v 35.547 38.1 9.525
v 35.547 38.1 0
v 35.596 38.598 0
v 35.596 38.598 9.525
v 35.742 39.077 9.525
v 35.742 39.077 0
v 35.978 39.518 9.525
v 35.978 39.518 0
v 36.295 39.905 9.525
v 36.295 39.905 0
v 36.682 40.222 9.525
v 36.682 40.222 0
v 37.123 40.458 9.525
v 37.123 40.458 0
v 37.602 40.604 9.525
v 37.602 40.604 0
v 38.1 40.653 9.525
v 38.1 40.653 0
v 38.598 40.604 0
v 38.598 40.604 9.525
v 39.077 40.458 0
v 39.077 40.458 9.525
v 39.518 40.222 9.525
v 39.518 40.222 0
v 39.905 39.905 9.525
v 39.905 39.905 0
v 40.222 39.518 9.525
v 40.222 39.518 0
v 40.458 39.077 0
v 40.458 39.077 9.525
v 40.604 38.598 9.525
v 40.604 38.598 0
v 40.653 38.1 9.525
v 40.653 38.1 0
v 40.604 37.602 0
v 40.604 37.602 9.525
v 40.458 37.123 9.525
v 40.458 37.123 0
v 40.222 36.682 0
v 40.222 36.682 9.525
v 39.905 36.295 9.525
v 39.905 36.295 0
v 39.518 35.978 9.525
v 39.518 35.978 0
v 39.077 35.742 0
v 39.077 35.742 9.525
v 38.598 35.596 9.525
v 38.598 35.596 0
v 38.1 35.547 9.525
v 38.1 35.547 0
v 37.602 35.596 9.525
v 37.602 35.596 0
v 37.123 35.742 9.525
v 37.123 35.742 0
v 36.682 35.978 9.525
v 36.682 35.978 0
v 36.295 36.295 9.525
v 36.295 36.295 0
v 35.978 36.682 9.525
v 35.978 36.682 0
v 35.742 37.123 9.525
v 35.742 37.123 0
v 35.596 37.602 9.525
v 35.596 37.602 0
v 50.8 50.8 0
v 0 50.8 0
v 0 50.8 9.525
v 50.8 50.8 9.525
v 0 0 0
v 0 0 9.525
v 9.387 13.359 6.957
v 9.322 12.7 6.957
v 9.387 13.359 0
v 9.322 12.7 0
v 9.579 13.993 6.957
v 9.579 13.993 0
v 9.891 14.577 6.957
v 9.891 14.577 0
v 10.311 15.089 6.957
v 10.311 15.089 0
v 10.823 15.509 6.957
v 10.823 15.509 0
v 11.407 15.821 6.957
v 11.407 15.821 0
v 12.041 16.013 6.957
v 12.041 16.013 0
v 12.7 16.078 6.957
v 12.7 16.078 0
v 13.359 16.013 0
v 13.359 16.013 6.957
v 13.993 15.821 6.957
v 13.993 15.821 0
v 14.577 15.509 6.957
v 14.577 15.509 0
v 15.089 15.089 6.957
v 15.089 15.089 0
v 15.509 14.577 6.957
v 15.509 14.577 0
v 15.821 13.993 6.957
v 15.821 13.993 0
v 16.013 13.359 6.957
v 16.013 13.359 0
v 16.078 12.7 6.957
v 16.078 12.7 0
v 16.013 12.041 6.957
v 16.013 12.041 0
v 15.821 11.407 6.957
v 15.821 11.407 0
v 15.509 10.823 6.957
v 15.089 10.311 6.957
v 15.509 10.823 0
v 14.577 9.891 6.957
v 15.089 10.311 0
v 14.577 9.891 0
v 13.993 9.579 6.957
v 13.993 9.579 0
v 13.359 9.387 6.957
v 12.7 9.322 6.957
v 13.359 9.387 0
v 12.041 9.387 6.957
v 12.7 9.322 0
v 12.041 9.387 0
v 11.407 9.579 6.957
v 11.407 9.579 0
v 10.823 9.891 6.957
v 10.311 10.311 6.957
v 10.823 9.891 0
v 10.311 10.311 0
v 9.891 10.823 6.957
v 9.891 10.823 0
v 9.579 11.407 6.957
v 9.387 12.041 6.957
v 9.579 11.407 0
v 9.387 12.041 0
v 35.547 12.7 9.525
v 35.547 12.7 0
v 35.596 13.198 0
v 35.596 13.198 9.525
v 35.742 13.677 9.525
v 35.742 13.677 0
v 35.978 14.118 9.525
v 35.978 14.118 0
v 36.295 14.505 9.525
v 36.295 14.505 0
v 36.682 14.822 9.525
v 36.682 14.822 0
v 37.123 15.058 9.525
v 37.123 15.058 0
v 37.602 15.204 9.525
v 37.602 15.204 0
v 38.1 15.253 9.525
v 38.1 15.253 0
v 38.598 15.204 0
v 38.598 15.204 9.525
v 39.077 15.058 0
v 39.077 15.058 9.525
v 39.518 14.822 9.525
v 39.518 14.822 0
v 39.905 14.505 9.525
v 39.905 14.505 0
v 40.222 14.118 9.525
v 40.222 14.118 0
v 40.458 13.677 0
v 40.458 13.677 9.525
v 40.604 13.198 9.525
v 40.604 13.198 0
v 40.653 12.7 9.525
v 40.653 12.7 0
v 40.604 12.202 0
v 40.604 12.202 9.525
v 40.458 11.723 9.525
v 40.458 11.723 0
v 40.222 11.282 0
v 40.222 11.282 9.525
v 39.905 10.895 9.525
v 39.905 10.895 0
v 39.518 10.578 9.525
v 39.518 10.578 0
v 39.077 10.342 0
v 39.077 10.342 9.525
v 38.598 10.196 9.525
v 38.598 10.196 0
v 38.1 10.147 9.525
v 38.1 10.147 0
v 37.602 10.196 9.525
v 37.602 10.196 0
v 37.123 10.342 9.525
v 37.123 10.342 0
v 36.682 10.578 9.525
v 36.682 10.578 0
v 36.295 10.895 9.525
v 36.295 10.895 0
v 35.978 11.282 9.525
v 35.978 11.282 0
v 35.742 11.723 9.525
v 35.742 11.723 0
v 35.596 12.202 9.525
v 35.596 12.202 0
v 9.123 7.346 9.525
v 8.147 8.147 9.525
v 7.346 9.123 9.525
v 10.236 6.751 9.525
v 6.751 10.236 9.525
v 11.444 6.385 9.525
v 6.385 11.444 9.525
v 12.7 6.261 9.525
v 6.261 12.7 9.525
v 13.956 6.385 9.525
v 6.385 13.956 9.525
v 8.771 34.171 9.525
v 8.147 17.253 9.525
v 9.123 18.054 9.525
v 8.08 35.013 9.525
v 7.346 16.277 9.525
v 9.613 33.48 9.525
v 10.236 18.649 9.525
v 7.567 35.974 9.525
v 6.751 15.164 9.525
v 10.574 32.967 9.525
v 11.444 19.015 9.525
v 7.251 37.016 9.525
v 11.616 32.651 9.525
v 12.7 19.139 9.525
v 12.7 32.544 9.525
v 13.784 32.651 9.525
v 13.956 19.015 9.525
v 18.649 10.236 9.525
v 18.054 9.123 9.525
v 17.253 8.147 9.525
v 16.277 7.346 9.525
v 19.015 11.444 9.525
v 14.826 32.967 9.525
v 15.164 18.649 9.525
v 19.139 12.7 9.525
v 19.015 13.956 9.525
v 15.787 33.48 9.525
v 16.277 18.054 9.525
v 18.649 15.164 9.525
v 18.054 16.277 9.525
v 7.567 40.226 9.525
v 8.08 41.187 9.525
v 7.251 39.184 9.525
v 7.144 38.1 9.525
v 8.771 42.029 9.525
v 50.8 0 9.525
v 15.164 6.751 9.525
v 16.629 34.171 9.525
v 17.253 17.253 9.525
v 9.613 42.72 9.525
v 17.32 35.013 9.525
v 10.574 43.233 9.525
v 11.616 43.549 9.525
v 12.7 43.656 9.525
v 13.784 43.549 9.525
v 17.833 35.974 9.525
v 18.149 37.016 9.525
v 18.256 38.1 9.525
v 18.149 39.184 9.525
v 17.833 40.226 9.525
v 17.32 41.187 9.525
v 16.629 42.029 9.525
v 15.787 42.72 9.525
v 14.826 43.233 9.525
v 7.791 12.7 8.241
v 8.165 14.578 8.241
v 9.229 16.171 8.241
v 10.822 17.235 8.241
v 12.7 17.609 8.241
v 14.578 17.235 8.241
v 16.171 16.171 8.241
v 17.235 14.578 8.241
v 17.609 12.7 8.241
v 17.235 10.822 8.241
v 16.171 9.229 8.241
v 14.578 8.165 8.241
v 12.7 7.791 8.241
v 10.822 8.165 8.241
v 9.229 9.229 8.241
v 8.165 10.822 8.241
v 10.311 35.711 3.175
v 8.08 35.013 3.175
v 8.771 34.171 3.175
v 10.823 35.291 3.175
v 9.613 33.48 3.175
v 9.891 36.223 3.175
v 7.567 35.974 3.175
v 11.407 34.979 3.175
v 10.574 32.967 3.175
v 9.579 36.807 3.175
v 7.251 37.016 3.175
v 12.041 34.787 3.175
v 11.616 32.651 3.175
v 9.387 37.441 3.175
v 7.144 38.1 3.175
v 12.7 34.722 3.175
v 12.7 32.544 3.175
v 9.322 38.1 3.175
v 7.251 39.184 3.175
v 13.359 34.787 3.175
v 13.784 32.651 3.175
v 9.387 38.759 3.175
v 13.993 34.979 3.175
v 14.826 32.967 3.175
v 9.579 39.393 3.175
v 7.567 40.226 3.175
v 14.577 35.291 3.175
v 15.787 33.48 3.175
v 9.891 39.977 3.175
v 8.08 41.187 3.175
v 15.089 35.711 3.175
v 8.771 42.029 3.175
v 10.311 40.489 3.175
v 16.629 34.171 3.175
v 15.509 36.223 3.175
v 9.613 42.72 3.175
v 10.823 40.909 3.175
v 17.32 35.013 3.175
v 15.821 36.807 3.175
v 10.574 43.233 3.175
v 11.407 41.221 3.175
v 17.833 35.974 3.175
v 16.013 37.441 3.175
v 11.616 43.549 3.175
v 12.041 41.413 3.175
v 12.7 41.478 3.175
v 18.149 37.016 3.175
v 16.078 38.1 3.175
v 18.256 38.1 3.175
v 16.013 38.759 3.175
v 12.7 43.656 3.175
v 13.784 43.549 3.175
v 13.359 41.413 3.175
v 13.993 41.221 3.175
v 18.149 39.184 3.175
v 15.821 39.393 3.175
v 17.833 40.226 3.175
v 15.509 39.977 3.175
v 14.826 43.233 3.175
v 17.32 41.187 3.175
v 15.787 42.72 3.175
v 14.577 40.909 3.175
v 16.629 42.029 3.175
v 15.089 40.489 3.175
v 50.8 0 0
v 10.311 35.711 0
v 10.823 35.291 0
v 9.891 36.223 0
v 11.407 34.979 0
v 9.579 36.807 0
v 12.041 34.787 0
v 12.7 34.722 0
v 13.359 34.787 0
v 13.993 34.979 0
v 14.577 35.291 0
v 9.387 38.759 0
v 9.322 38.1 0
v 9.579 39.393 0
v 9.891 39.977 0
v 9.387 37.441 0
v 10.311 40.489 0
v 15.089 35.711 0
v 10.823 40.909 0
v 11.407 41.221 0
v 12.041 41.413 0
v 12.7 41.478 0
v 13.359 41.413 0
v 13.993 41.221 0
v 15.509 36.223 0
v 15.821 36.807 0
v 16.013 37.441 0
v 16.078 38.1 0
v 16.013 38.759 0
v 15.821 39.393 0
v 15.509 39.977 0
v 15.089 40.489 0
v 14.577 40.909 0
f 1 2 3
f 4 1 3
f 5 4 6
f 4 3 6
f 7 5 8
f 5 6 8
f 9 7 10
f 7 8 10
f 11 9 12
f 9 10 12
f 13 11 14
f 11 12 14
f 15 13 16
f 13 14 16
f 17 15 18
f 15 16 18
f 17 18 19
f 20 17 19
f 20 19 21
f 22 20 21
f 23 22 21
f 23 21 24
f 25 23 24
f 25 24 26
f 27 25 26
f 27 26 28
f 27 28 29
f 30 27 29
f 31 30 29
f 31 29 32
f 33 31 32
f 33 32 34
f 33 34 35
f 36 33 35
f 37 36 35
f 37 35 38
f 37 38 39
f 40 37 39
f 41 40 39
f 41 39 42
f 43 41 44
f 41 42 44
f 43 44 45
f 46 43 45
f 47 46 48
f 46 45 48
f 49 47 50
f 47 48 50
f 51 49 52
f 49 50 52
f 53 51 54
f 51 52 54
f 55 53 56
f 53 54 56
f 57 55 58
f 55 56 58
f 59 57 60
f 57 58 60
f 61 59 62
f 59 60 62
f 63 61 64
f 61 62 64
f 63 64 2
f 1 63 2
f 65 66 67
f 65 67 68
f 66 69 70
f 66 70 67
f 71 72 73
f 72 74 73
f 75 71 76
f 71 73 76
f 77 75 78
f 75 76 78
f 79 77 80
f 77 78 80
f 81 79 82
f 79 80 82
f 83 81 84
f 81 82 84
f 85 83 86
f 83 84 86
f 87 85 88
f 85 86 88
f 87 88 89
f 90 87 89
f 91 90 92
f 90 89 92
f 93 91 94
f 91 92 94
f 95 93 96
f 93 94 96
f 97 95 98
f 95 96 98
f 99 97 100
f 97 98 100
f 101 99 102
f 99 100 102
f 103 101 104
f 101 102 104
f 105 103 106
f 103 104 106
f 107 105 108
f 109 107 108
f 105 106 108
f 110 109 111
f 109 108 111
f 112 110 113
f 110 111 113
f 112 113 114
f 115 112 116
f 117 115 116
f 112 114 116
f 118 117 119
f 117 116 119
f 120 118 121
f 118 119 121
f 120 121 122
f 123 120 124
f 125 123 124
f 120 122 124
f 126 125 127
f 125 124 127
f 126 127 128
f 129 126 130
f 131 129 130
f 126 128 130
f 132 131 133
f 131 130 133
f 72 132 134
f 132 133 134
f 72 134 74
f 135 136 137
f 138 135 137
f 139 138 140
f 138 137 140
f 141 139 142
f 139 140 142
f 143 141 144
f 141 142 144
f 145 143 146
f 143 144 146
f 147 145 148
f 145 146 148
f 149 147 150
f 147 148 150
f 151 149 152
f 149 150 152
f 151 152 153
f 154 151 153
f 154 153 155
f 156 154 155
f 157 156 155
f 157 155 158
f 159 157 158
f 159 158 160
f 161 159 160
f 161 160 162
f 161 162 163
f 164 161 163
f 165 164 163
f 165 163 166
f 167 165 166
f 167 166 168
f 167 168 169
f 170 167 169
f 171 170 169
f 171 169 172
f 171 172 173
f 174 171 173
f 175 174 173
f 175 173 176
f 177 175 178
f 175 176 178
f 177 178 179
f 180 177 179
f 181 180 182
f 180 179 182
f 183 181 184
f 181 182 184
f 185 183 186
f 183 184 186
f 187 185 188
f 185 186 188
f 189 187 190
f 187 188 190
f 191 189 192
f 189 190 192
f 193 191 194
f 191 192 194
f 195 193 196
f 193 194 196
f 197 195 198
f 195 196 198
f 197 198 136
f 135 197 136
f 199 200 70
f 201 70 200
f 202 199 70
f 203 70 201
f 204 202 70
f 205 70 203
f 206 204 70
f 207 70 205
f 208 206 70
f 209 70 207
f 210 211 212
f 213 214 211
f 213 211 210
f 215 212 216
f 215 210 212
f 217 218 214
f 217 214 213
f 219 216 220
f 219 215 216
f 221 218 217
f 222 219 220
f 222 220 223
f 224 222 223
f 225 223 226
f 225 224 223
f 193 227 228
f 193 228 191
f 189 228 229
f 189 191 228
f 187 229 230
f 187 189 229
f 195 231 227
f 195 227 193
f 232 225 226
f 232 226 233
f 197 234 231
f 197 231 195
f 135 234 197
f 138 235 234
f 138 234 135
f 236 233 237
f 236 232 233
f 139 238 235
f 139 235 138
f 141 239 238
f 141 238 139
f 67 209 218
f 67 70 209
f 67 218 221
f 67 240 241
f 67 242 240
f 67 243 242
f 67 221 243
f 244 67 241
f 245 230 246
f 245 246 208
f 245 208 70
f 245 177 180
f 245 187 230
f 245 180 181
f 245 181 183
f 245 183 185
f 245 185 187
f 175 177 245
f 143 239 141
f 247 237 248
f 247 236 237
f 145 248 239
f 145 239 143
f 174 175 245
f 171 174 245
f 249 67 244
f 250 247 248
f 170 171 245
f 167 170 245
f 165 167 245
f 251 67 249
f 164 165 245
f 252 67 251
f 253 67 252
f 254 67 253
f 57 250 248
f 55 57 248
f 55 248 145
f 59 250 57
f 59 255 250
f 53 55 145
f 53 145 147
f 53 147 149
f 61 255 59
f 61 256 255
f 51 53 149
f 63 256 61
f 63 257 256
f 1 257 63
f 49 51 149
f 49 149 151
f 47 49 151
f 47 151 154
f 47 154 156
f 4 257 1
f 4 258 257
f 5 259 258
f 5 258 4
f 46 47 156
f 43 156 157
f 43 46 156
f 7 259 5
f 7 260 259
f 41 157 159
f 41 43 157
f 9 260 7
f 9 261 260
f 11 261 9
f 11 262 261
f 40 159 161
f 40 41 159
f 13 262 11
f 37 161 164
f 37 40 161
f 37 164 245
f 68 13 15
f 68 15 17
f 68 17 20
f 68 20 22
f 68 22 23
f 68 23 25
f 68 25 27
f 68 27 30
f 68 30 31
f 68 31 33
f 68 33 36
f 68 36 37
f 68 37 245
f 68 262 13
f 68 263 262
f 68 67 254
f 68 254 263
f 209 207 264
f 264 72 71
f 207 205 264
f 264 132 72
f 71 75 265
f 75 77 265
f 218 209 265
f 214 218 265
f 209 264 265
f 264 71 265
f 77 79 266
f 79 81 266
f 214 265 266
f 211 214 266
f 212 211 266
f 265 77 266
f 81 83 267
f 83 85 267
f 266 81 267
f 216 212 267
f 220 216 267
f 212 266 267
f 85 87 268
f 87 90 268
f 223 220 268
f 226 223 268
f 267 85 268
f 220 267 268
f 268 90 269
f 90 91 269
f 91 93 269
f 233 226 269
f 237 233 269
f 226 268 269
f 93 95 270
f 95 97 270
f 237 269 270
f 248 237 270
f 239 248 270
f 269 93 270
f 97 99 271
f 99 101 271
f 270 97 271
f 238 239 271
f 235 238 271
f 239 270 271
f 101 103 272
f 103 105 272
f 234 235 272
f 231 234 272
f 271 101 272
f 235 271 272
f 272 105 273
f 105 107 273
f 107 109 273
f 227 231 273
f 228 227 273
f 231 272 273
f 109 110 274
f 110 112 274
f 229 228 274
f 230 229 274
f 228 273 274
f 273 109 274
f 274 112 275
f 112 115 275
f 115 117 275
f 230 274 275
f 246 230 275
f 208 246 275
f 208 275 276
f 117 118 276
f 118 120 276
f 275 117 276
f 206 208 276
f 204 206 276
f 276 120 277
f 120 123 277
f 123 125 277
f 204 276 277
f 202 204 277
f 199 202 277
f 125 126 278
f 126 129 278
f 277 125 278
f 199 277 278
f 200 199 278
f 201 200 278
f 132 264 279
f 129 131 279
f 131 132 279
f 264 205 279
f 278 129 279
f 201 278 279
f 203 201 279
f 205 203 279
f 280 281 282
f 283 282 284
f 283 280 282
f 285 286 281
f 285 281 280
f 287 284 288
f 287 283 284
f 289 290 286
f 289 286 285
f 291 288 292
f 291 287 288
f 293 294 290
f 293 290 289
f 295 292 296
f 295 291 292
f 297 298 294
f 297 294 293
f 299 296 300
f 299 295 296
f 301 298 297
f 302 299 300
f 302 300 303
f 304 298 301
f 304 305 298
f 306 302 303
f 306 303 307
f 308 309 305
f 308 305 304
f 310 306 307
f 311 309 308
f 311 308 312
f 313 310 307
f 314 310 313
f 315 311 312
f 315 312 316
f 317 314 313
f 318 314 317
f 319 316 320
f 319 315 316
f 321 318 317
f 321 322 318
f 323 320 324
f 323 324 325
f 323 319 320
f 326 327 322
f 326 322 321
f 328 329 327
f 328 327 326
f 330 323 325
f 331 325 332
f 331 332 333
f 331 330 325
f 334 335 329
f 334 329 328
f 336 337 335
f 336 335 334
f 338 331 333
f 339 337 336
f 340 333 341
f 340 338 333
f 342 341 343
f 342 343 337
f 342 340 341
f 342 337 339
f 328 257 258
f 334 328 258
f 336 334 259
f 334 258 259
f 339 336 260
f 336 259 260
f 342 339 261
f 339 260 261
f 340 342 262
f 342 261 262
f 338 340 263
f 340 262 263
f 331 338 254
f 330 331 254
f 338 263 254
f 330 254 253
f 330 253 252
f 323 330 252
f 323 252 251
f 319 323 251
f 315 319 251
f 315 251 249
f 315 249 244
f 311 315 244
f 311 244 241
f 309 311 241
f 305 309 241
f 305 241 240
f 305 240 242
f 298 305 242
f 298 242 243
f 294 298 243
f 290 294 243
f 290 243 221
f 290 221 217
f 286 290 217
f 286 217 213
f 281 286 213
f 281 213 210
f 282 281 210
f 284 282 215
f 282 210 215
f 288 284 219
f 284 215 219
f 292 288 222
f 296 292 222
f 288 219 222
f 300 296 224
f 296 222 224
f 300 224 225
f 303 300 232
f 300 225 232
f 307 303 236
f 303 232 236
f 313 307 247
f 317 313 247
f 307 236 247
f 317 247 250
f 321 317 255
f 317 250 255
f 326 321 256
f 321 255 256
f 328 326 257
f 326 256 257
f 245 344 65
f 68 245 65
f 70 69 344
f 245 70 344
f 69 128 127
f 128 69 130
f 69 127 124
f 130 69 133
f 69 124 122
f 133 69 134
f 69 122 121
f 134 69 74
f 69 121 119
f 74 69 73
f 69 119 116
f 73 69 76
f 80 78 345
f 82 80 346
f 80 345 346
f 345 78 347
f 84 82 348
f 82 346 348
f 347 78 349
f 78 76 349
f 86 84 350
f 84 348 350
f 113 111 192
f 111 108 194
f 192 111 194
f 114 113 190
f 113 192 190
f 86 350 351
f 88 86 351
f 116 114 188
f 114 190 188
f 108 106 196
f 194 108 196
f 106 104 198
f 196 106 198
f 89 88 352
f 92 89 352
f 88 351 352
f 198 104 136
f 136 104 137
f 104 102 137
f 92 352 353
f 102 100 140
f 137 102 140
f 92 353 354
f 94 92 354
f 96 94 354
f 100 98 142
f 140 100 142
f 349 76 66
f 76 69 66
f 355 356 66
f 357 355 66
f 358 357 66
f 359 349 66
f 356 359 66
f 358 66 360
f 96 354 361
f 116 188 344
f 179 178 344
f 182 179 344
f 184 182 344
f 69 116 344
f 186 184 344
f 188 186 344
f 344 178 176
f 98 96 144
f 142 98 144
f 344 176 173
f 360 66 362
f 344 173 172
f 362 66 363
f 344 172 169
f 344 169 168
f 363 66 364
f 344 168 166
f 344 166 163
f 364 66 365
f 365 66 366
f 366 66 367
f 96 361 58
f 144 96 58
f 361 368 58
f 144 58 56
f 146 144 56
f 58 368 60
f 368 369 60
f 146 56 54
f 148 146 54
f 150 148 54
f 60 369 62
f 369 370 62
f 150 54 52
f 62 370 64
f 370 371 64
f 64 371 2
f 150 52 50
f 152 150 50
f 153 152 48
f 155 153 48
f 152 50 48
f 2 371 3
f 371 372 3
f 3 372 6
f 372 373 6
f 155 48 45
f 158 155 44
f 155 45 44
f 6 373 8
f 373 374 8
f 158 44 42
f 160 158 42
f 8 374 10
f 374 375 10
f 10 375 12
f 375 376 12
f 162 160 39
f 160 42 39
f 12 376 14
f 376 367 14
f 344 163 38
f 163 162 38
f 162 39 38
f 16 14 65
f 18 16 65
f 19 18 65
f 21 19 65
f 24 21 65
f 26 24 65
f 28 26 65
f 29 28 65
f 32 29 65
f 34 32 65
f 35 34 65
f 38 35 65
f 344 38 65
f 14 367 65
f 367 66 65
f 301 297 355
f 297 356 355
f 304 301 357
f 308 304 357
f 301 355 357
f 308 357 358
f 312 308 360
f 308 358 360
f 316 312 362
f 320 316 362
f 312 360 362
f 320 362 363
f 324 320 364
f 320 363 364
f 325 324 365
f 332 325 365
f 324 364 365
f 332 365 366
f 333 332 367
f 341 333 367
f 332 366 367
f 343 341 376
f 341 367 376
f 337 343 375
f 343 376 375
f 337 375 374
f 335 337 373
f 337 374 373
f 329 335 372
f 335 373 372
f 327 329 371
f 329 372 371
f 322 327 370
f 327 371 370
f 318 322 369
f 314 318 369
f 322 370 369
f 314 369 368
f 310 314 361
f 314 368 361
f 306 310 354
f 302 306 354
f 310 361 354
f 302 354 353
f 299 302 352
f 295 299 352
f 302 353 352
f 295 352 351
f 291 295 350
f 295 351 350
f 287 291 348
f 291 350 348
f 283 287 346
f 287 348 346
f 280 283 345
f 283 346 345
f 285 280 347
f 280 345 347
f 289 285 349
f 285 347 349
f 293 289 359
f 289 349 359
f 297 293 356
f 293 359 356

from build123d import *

# Parameters (mm, degrees)
SKETCH1_W                                           = 50.8
SKETCH1_H                                           = 50.8
BOSS_EXTRUDE1_DEPTH                                 = 9.525
CBORE_FOR_1_4_SOCKET_HEAD_CAP_SCREW1_D              = 6.7564
CBORE_FOR_1_4_SOCKET_HEAD_CAP_SCREW1_CBORE_D        = 11.1125
CBORE_FOR_1_4_SOCKET_HEAD_CAP_SCREW1_CBORE_DEPTH    = 6.35
F_1_4_20_TAPPED_HOLE1_D                             = 5.1054
CSK_FOR_1_4_FLAT_HEAD_MACHINE_SCREW_100_D           = 6.7564
CSK_FOR_1_4_FLAT_HEAD_MACHINE_SCREW_100_CSINK_D     = 12.8778
CSK_FOR_1_4_FLAT_HEAD_MACHINE_SCREW_100_CSINK_ANGLE = 100


with BuildPart() as part:
    # Sketch1 → Boss-Extrude1 (new body)
    with BuildSketch(Plane.XY):
        with Locations((25.4, 25.4)):
            Rectangle(SKETCH1_W, SKETCH1_H)
    extrude(amount=BOSS_EXTRUDE1_DEPTH)

    # CBORE for 1/4 Socket Head Cap Screw1 (through all)
    with Locations(Plane.XY.offset(9.525)):
        with Locations((12.7, 38.1)):
            CounterBoreHole(CBORE_FOR_1_4_SOCKET_HEAD_CAP_SCREW1_D / 2, CBORE_FOR_1_4_SOCKET_HEAD_CAP_SCREW1_CBORE_D / 2, CBORE_FOR_1_4_SOCKET_HEAD_CAP_SCREW1_CBORE_DEPTH)

    # 1/4-20 Tapped Hole1 (through all)
    with Locations(Plane.XY.offset(9.525)):
        with Locations((38.1, 38.1), (38.1, 12.7)):
            Hole(F_1_4_20_TAPPED_HOLE1_D / 2)

    # CSK for 1/4 Flat Head Machine Screw (100)1 (through all)
    with Locations(Plane.XY.offset(9.525)):
        with Locations((12.7, 12.7)):
            CounterSinkHole(CSK_FOR_1_4_FLAT_HEAD_MACHINE_SCREW_100_D / 2, CSK_FOR_1_4_FLAT_HEAD_MACHINE_SCREW_100_CSINK_D / 2, counter_sink_angle=CSK_FOR_1_4_FLAT_HEAD_MACHINE_SCREW_100_CSINK_ANGLE)


solid = part.part
